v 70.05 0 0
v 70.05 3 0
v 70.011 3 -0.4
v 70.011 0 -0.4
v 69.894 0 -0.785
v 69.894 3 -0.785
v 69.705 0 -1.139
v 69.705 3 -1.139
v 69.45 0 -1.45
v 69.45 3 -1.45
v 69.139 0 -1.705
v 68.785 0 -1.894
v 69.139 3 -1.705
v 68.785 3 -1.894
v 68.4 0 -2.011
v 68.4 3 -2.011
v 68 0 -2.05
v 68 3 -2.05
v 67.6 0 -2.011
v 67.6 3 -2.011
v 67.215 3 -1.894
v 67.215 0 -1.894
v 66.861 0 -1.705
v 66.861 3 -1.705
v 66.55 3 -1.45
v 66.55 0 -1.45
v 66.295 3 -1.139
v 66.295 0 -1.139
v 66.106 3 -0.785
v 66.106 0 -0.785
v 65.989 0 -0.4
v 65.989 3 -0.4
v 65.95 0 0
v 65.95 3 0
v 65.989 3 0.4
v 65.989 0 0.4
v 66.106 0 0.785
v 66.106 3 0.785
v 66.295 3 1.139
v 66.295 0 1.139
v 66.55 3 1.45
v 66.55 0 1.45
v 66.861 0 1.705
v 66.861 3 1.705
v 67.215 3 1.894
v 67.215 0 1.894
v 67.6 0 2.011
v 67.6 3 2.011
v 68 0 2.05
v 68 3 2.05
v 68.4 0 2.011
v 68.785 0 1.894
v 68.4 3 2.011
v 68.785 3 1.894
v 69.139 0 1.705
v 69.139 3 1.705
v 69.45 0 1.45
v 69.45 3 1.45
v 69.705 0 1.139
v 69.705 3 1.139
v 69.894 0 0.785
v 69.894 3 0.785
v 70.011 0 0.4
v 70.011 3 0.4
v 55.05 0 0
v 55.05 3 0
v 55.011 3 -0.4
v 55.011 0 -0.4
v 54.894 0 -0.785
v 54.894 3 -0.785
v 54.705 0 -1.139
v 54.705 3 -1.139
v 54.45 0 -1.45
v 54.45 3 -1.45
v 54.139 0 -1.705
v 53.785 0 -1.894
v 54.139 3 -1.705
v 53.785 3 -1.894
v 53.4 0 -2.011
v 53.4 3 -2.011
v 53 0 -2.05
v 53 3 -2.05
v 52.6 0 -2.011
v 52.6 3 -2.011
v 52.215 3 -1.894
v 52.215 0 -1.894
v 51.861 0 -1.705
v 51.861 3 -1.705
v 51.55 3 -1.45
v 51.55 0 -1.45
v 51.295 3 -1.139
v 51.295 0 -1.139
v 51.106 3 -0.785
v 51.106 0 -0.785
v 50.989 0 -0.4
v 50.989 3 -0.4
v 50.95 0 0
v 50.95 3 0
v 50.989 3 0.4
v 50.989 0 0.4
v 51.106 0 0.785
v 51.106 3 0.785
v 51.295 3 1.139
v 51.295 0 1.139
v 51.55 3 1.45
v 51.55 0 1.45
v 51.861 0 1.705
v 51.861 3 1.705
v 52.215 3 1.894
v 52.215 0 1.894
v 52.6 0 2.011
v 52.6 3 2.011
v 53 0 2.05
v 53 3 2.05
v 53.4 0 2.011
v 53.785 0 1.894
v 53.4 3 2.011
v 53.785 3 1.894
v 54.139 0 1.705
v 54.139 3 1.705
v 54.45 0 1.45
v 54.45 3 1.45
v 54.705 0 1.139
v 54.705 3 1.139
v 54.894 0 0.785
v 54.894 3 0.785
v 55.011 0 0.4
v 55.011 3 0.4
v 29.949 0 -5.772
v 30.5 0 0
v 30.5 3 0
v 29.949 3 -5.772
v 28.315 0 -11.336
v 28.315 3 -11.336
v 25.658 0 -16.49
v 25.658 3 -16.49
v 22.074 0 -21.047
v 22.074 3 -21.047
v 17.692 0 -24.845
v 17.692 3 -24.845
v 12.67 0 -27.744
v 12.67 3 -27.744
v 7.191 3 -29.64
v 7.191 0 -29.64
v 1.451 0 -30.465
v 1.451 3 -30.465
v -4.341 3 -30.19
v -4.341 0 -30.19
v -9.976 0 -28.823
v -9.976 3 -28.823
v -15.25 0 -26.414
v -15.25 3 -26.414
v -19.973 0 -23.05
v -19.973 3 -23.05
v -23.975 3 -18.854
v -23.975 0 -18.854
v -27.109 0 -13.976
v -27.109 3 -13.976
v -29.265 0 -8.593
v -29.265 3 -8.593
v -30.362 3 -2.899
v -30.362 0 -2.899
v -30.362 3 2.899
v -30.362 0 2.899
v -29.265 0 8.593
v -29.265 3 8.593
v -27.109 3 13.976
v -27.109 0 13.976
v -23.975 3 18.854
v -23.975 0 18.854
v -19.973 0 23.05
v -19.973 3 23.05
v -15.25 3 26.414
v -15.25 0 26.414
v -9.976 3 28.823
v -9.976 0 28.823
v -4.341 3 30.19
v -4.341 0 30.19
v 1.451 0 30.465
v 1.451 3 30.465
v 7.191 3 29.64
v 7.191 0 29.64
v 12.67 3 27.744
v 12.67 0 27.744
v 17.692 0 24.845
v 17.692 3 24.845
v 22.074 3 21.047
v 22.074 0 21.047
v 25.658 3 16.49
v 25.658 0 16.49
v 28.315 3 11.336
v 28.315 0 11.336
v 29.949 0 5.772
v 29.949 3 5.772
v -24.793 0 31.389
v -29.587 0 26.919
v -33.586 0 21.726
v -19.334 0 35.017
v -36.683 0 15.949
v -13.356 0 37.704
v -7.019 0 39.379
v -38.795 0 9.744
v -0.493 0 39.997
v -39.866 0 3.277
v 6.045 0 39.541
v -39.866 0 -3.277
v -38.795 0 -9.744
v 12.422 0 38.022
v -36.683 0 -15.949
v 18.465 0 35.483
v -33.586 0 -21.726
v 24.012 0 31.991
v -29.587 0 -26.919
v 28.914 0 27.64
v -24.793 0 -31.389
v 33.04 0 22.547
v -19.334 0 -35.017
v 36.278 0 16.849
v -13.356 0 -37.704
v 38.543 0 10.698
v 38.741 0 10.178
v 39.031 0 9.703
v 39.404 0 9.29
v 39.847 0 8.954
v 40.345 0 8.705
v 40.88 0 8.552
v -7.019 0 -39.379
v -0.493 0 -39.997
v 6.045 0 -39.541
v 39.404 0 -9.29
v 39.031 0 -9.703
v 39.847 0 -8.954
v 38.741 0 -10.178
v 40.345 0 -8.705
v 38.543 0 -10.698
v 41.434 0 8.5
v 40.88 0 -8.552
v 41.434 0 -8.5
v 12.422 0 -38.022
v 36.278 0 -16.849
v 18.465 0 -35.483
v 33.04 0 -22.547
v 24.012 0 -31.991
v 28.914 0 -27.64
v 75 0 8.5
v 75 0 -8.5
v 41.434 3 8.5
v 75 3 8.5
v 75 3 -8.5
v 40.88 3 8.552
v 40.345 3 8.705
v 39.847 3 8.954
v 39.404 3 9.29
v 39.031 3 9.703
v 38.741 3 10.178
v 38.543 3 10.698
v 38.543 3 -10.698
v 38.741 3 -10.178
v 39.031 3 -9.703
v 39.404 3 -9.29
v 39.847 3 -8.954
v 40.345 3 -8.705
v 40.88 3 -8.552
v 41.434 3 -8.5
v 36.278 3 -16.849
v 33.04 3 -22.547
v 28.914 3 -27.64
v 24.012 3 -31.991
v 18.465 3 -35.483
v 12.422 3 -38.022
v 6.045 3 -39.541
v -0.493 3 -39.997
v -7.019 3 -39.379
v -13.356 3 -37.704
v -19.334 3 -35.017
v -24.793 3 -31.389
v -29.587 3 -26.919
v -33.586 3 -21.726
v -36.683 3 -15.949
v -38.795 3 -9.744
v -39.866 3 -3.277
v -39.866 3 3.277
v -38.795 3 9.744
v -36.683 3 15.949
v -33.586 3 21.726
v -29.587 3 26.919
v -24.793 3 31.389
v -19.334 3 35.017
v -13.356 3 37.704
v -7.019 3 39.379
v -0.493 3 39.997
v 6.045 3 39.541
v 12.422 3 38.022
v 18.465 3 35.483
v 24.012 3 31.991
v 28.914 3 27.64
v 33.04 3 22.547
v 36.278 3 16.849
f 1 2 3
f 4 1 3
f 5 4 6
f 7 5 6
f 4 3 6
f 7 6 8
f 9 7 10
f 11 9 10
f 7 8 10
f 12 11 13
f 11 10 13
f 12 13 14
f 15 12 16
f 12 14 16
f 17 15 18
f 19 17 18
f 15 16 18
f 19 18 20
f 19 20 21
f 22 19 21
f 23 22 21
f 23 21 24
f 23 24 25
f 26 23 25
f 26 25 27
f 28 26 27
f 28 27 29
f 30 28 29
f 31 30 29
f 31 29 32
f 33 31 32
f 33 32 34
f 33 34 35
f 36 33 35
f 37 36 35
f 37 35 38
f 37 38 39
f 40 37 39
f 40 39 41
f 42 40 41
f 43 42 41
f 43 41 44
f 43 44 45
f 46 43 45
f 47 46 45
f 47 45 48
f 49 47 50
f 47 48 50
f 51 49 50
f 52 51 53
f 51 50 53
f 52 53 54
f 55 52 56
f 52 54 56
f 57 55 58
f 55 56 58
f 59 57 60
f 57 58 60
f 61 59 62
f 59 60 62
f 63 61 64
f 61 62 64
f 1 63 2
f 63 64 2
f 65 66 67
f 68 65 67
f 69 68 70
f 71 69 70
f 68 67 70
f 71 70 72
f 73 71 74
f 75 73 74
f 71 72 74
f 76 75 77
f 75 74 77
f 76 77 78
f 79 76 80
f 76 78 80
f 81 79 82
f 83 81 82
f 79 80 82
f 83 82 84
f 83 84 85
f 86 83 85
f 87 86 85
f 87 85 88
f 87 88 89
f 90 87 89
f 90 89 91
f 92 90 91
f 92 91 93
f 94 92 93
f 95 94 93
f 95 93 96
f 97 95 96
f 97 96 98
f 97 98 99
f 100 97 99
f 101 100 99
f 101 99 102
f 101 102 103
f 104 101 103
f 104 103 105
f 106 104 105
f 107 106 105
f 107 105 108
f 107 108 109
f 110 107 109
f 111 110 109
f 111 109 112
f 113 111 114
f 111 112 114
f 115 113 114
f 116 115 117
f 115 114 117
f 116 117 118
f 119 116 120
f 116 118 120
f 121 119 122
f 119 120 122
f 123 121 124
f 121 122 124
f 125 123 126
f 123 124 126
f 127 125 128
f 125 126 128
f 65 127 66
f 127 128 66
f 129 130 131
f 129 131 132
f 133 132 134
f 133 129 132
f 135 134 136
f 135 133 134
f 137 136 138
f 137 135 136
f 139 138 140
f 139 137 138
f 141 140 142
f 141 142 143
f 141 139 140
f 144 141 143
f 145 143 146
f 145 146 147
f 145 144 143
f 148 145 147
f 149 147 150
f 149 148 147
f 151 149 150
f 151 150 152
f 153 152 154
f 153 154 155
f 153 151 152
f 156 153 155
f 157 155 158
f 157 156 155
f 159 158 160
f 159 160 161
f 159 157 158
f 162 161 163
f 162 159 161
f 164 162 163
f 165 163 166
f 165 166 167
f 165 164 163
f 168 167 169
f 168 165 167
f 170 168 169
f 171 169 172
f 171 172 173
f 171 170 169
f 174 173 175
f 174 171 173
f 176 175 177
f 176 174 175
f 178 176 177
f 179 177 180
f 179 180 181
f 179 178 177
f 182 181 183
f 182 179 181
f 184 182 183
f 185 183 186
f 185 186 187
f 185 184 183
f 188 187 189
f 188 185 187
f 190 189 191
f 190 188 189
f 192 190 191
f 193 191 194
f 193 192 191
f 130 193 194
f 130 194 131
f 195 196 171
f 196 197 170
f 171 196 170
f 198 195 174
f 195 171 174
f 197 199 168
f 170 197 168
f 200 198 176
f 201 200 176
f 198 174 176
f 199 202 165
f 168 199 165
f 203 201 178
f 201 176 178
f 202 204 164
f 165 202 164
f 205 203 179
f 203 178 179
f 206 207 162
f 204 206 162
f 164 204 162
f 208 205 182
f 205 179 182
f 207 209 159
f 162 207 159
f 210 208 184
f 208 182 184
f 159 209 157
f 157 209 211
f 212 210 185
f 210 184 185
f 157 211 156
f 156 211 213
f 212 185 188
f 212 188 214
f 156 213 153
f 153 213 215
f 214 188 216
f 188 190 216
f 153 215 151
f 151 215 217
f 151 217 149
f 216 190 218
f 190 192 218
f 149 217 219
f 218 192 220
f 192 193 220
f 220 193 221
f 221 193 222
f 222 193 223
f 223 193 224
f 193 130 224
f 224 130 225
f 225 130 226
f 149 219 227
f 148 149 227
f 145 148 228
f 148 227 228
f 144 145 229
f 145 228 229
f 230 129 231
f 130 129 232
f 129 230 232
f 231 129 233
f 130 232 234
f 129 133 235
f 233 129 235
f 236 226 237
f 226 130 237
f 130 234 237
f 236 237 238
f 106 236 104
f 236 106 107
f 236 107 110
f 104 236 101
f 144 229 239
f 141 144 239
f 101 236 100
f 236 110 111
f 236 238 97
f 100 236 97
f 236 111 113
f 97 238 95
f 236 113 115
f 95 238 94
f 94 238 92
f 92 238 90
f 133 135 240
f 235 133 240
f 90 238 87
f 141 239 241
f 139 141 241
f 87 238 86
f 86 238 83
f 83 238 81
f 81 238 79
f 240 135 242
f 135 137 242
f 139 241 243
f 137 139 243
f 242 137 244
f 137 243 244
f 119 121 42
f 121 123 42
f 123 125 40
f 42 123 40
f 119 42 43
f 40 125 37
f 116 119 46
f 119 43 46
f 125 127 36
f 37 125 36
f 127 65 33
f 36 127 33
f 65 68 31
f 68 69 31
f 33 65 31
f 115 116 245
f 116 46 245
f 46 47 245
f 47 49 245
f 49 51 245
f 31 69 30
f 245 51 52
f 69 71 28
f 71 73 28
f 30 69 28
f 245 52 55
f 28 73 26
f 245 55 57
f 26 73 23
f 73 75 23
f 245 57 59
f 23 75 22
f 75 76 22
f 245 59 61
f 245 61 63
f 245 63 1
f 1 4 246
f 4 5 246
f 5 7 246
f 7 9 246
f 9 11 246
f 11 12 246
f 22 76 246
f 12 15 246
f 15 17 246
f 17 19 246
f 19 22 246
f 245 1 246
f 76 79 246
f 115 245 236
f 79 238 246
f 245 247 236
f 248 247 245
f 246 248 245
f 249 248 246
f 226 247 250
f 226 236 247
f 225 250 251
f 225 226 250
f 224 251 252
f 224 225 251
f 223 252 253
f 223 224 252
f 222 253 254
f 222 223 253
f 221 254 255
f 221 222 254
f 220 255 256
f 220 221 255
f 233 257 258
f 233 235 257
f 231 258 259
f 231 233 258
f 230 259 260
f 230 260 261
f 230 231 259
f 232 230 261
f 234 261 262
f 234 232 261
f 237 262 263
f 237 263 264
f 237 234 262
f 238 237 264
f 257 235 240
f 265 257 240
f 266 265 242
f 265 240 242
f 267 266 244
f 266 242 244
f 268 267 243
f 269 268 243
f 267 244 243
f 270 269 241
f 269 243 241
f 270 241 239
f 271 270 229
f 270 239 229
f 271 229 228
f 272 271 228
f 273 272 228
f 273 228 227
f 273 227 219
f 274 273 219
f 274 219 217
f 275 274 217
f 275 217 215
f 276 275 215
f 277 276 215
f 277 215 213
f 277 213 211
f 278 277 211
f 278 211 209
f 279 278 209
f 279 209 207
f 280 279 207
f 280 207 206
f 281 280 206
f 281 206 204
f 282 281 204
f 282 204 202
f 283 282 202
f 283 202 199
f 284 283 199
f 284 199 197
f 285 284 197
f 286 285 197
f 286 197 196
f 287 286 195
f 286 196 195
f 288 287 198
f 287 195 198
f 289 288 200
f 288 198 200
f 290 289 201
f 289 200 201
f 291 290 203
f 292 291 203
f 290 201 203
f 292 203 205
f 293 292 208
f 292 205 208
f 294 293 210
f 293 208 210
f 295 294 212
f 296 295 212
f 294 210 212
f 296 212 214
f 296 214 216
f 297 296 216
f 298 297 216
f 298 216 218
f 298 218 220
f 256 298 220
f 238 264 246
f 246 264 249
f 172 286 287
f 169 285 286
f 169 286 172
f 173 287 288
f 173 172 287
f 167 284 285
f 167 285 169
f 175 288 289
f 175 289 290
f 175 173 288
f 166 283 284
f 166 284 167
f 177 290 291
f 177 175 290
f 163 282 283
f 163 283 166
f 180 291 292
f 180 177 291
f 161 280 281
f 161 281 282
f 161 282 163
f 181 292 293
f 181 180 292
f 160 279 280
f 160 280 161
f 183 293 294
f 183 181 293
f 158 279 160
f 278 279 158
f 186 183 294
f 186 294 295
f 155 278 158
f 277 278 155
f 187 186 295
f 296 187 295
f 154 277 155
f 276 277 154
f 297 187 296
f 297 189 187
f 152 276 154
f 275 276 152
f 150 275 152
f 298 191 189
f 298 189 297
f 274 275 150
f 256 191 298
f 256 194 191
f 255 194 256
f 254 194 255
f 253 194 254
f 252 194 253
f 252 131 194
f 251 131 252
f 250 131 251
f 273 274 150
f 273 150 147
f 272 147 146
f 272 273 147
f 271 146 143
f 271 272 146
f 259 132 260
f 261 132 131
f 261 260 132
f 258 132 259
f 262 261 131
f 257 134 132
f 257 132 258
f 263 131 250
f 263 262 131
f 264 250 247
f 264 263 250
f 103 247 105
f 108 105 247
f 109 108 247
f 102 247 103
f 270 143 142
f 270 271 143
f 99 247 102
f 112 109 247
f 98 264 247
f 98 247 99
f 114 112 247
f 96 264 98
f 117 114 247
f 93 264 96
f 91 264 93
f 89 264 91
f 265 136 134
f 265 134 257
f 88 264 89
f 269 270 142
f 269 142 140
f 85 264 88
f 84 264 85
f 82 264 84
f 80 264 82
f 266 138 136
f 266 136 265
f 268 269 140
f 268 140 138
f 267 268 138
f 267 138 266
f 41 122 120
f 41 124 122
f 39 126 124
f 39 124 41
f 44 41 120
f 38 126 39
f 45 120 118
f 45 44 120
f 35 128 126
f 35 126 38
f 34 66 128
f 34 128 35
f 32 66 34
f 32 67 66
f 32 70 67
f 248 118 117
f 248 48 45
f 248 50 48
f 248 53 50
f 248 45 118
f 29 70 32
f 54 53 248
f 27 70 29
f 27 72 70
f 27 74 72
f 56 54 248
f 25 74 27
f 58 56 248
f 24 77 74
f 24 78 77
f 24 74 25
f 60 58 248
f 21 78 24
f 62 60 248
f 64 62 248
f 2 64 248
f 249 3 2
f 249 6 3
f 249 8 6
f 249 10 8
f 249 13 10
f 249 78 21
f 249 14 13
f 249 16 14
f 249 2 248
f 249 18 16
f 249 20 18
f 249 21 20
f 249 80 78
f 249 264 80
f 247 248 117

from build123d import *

# Parameters (mm, degrees)
SKETCH1_R           = 40
SKETCH1_R_2         = 30.5
BOSS_EXTRUDE1_DEPTH = 3
SKETCH2_W           = 40
SKETCH2_H           = 17
BOSS_EXTRUDE2_DEPTH = 3
SKETCH3_R           = 2.05
CUT_EXTRUDE1_DEPTH  = 4
FILLET1_R           = 3


with BuildPart() as part:
    # Sketch1 → Boss-Extrude1 (new body)
    with BuildSketch(Plane(origin=(0, 0, 0), x_dir=(1, 0, 0), z_dir=(0, 1, 0))):
        Circle(SKETCH1_R)
        Circle(SKETCH1_R_2, mode=Mode.SUBTRACT)
    extrude(amount=BOSS_EXTRUDE1_DEPTH)

    # Sketch2 → Boss-Extrude2 (add)
    with BuildSketch(Plane(origin=(0, 3, 0), x_dir=(1, 0, 0), z_dir=(0, 1, 0))):
        with Locations((55, 0)):
            Rectangle(SKETCH2_W, SKETCH2_H)
    extrude(amount=-BOSS_EXTRUDE2_DEPTH)

    # Sketch3 → Cut-Extrude1 (cut, through all)
    with BuildSketch(Plane(origin=(0, 3, 0), x_dir=(1, 0, 0), z_dir=(0, 1, 0))):
        with Locations((53, 0)):
            Circle(SKETCH3_R)
        with Locations((68, 0)):
            Circle(SKETCH3_R)
    extrude(amount=-CUT_EXTRUDE1_DEPTH, mode=Mode.SUBTRACT)

    # Fillet1
    fillet1_edges = [part.edges().sort_by_distance(p)[0] for p in [
        (39.086442662, 1.5, 8.5),
        (39.086442662, 1.5, -8.5),
    ]]
    fillet(fillet1_edges, radius=FILLET1_R)


solid = part.part
